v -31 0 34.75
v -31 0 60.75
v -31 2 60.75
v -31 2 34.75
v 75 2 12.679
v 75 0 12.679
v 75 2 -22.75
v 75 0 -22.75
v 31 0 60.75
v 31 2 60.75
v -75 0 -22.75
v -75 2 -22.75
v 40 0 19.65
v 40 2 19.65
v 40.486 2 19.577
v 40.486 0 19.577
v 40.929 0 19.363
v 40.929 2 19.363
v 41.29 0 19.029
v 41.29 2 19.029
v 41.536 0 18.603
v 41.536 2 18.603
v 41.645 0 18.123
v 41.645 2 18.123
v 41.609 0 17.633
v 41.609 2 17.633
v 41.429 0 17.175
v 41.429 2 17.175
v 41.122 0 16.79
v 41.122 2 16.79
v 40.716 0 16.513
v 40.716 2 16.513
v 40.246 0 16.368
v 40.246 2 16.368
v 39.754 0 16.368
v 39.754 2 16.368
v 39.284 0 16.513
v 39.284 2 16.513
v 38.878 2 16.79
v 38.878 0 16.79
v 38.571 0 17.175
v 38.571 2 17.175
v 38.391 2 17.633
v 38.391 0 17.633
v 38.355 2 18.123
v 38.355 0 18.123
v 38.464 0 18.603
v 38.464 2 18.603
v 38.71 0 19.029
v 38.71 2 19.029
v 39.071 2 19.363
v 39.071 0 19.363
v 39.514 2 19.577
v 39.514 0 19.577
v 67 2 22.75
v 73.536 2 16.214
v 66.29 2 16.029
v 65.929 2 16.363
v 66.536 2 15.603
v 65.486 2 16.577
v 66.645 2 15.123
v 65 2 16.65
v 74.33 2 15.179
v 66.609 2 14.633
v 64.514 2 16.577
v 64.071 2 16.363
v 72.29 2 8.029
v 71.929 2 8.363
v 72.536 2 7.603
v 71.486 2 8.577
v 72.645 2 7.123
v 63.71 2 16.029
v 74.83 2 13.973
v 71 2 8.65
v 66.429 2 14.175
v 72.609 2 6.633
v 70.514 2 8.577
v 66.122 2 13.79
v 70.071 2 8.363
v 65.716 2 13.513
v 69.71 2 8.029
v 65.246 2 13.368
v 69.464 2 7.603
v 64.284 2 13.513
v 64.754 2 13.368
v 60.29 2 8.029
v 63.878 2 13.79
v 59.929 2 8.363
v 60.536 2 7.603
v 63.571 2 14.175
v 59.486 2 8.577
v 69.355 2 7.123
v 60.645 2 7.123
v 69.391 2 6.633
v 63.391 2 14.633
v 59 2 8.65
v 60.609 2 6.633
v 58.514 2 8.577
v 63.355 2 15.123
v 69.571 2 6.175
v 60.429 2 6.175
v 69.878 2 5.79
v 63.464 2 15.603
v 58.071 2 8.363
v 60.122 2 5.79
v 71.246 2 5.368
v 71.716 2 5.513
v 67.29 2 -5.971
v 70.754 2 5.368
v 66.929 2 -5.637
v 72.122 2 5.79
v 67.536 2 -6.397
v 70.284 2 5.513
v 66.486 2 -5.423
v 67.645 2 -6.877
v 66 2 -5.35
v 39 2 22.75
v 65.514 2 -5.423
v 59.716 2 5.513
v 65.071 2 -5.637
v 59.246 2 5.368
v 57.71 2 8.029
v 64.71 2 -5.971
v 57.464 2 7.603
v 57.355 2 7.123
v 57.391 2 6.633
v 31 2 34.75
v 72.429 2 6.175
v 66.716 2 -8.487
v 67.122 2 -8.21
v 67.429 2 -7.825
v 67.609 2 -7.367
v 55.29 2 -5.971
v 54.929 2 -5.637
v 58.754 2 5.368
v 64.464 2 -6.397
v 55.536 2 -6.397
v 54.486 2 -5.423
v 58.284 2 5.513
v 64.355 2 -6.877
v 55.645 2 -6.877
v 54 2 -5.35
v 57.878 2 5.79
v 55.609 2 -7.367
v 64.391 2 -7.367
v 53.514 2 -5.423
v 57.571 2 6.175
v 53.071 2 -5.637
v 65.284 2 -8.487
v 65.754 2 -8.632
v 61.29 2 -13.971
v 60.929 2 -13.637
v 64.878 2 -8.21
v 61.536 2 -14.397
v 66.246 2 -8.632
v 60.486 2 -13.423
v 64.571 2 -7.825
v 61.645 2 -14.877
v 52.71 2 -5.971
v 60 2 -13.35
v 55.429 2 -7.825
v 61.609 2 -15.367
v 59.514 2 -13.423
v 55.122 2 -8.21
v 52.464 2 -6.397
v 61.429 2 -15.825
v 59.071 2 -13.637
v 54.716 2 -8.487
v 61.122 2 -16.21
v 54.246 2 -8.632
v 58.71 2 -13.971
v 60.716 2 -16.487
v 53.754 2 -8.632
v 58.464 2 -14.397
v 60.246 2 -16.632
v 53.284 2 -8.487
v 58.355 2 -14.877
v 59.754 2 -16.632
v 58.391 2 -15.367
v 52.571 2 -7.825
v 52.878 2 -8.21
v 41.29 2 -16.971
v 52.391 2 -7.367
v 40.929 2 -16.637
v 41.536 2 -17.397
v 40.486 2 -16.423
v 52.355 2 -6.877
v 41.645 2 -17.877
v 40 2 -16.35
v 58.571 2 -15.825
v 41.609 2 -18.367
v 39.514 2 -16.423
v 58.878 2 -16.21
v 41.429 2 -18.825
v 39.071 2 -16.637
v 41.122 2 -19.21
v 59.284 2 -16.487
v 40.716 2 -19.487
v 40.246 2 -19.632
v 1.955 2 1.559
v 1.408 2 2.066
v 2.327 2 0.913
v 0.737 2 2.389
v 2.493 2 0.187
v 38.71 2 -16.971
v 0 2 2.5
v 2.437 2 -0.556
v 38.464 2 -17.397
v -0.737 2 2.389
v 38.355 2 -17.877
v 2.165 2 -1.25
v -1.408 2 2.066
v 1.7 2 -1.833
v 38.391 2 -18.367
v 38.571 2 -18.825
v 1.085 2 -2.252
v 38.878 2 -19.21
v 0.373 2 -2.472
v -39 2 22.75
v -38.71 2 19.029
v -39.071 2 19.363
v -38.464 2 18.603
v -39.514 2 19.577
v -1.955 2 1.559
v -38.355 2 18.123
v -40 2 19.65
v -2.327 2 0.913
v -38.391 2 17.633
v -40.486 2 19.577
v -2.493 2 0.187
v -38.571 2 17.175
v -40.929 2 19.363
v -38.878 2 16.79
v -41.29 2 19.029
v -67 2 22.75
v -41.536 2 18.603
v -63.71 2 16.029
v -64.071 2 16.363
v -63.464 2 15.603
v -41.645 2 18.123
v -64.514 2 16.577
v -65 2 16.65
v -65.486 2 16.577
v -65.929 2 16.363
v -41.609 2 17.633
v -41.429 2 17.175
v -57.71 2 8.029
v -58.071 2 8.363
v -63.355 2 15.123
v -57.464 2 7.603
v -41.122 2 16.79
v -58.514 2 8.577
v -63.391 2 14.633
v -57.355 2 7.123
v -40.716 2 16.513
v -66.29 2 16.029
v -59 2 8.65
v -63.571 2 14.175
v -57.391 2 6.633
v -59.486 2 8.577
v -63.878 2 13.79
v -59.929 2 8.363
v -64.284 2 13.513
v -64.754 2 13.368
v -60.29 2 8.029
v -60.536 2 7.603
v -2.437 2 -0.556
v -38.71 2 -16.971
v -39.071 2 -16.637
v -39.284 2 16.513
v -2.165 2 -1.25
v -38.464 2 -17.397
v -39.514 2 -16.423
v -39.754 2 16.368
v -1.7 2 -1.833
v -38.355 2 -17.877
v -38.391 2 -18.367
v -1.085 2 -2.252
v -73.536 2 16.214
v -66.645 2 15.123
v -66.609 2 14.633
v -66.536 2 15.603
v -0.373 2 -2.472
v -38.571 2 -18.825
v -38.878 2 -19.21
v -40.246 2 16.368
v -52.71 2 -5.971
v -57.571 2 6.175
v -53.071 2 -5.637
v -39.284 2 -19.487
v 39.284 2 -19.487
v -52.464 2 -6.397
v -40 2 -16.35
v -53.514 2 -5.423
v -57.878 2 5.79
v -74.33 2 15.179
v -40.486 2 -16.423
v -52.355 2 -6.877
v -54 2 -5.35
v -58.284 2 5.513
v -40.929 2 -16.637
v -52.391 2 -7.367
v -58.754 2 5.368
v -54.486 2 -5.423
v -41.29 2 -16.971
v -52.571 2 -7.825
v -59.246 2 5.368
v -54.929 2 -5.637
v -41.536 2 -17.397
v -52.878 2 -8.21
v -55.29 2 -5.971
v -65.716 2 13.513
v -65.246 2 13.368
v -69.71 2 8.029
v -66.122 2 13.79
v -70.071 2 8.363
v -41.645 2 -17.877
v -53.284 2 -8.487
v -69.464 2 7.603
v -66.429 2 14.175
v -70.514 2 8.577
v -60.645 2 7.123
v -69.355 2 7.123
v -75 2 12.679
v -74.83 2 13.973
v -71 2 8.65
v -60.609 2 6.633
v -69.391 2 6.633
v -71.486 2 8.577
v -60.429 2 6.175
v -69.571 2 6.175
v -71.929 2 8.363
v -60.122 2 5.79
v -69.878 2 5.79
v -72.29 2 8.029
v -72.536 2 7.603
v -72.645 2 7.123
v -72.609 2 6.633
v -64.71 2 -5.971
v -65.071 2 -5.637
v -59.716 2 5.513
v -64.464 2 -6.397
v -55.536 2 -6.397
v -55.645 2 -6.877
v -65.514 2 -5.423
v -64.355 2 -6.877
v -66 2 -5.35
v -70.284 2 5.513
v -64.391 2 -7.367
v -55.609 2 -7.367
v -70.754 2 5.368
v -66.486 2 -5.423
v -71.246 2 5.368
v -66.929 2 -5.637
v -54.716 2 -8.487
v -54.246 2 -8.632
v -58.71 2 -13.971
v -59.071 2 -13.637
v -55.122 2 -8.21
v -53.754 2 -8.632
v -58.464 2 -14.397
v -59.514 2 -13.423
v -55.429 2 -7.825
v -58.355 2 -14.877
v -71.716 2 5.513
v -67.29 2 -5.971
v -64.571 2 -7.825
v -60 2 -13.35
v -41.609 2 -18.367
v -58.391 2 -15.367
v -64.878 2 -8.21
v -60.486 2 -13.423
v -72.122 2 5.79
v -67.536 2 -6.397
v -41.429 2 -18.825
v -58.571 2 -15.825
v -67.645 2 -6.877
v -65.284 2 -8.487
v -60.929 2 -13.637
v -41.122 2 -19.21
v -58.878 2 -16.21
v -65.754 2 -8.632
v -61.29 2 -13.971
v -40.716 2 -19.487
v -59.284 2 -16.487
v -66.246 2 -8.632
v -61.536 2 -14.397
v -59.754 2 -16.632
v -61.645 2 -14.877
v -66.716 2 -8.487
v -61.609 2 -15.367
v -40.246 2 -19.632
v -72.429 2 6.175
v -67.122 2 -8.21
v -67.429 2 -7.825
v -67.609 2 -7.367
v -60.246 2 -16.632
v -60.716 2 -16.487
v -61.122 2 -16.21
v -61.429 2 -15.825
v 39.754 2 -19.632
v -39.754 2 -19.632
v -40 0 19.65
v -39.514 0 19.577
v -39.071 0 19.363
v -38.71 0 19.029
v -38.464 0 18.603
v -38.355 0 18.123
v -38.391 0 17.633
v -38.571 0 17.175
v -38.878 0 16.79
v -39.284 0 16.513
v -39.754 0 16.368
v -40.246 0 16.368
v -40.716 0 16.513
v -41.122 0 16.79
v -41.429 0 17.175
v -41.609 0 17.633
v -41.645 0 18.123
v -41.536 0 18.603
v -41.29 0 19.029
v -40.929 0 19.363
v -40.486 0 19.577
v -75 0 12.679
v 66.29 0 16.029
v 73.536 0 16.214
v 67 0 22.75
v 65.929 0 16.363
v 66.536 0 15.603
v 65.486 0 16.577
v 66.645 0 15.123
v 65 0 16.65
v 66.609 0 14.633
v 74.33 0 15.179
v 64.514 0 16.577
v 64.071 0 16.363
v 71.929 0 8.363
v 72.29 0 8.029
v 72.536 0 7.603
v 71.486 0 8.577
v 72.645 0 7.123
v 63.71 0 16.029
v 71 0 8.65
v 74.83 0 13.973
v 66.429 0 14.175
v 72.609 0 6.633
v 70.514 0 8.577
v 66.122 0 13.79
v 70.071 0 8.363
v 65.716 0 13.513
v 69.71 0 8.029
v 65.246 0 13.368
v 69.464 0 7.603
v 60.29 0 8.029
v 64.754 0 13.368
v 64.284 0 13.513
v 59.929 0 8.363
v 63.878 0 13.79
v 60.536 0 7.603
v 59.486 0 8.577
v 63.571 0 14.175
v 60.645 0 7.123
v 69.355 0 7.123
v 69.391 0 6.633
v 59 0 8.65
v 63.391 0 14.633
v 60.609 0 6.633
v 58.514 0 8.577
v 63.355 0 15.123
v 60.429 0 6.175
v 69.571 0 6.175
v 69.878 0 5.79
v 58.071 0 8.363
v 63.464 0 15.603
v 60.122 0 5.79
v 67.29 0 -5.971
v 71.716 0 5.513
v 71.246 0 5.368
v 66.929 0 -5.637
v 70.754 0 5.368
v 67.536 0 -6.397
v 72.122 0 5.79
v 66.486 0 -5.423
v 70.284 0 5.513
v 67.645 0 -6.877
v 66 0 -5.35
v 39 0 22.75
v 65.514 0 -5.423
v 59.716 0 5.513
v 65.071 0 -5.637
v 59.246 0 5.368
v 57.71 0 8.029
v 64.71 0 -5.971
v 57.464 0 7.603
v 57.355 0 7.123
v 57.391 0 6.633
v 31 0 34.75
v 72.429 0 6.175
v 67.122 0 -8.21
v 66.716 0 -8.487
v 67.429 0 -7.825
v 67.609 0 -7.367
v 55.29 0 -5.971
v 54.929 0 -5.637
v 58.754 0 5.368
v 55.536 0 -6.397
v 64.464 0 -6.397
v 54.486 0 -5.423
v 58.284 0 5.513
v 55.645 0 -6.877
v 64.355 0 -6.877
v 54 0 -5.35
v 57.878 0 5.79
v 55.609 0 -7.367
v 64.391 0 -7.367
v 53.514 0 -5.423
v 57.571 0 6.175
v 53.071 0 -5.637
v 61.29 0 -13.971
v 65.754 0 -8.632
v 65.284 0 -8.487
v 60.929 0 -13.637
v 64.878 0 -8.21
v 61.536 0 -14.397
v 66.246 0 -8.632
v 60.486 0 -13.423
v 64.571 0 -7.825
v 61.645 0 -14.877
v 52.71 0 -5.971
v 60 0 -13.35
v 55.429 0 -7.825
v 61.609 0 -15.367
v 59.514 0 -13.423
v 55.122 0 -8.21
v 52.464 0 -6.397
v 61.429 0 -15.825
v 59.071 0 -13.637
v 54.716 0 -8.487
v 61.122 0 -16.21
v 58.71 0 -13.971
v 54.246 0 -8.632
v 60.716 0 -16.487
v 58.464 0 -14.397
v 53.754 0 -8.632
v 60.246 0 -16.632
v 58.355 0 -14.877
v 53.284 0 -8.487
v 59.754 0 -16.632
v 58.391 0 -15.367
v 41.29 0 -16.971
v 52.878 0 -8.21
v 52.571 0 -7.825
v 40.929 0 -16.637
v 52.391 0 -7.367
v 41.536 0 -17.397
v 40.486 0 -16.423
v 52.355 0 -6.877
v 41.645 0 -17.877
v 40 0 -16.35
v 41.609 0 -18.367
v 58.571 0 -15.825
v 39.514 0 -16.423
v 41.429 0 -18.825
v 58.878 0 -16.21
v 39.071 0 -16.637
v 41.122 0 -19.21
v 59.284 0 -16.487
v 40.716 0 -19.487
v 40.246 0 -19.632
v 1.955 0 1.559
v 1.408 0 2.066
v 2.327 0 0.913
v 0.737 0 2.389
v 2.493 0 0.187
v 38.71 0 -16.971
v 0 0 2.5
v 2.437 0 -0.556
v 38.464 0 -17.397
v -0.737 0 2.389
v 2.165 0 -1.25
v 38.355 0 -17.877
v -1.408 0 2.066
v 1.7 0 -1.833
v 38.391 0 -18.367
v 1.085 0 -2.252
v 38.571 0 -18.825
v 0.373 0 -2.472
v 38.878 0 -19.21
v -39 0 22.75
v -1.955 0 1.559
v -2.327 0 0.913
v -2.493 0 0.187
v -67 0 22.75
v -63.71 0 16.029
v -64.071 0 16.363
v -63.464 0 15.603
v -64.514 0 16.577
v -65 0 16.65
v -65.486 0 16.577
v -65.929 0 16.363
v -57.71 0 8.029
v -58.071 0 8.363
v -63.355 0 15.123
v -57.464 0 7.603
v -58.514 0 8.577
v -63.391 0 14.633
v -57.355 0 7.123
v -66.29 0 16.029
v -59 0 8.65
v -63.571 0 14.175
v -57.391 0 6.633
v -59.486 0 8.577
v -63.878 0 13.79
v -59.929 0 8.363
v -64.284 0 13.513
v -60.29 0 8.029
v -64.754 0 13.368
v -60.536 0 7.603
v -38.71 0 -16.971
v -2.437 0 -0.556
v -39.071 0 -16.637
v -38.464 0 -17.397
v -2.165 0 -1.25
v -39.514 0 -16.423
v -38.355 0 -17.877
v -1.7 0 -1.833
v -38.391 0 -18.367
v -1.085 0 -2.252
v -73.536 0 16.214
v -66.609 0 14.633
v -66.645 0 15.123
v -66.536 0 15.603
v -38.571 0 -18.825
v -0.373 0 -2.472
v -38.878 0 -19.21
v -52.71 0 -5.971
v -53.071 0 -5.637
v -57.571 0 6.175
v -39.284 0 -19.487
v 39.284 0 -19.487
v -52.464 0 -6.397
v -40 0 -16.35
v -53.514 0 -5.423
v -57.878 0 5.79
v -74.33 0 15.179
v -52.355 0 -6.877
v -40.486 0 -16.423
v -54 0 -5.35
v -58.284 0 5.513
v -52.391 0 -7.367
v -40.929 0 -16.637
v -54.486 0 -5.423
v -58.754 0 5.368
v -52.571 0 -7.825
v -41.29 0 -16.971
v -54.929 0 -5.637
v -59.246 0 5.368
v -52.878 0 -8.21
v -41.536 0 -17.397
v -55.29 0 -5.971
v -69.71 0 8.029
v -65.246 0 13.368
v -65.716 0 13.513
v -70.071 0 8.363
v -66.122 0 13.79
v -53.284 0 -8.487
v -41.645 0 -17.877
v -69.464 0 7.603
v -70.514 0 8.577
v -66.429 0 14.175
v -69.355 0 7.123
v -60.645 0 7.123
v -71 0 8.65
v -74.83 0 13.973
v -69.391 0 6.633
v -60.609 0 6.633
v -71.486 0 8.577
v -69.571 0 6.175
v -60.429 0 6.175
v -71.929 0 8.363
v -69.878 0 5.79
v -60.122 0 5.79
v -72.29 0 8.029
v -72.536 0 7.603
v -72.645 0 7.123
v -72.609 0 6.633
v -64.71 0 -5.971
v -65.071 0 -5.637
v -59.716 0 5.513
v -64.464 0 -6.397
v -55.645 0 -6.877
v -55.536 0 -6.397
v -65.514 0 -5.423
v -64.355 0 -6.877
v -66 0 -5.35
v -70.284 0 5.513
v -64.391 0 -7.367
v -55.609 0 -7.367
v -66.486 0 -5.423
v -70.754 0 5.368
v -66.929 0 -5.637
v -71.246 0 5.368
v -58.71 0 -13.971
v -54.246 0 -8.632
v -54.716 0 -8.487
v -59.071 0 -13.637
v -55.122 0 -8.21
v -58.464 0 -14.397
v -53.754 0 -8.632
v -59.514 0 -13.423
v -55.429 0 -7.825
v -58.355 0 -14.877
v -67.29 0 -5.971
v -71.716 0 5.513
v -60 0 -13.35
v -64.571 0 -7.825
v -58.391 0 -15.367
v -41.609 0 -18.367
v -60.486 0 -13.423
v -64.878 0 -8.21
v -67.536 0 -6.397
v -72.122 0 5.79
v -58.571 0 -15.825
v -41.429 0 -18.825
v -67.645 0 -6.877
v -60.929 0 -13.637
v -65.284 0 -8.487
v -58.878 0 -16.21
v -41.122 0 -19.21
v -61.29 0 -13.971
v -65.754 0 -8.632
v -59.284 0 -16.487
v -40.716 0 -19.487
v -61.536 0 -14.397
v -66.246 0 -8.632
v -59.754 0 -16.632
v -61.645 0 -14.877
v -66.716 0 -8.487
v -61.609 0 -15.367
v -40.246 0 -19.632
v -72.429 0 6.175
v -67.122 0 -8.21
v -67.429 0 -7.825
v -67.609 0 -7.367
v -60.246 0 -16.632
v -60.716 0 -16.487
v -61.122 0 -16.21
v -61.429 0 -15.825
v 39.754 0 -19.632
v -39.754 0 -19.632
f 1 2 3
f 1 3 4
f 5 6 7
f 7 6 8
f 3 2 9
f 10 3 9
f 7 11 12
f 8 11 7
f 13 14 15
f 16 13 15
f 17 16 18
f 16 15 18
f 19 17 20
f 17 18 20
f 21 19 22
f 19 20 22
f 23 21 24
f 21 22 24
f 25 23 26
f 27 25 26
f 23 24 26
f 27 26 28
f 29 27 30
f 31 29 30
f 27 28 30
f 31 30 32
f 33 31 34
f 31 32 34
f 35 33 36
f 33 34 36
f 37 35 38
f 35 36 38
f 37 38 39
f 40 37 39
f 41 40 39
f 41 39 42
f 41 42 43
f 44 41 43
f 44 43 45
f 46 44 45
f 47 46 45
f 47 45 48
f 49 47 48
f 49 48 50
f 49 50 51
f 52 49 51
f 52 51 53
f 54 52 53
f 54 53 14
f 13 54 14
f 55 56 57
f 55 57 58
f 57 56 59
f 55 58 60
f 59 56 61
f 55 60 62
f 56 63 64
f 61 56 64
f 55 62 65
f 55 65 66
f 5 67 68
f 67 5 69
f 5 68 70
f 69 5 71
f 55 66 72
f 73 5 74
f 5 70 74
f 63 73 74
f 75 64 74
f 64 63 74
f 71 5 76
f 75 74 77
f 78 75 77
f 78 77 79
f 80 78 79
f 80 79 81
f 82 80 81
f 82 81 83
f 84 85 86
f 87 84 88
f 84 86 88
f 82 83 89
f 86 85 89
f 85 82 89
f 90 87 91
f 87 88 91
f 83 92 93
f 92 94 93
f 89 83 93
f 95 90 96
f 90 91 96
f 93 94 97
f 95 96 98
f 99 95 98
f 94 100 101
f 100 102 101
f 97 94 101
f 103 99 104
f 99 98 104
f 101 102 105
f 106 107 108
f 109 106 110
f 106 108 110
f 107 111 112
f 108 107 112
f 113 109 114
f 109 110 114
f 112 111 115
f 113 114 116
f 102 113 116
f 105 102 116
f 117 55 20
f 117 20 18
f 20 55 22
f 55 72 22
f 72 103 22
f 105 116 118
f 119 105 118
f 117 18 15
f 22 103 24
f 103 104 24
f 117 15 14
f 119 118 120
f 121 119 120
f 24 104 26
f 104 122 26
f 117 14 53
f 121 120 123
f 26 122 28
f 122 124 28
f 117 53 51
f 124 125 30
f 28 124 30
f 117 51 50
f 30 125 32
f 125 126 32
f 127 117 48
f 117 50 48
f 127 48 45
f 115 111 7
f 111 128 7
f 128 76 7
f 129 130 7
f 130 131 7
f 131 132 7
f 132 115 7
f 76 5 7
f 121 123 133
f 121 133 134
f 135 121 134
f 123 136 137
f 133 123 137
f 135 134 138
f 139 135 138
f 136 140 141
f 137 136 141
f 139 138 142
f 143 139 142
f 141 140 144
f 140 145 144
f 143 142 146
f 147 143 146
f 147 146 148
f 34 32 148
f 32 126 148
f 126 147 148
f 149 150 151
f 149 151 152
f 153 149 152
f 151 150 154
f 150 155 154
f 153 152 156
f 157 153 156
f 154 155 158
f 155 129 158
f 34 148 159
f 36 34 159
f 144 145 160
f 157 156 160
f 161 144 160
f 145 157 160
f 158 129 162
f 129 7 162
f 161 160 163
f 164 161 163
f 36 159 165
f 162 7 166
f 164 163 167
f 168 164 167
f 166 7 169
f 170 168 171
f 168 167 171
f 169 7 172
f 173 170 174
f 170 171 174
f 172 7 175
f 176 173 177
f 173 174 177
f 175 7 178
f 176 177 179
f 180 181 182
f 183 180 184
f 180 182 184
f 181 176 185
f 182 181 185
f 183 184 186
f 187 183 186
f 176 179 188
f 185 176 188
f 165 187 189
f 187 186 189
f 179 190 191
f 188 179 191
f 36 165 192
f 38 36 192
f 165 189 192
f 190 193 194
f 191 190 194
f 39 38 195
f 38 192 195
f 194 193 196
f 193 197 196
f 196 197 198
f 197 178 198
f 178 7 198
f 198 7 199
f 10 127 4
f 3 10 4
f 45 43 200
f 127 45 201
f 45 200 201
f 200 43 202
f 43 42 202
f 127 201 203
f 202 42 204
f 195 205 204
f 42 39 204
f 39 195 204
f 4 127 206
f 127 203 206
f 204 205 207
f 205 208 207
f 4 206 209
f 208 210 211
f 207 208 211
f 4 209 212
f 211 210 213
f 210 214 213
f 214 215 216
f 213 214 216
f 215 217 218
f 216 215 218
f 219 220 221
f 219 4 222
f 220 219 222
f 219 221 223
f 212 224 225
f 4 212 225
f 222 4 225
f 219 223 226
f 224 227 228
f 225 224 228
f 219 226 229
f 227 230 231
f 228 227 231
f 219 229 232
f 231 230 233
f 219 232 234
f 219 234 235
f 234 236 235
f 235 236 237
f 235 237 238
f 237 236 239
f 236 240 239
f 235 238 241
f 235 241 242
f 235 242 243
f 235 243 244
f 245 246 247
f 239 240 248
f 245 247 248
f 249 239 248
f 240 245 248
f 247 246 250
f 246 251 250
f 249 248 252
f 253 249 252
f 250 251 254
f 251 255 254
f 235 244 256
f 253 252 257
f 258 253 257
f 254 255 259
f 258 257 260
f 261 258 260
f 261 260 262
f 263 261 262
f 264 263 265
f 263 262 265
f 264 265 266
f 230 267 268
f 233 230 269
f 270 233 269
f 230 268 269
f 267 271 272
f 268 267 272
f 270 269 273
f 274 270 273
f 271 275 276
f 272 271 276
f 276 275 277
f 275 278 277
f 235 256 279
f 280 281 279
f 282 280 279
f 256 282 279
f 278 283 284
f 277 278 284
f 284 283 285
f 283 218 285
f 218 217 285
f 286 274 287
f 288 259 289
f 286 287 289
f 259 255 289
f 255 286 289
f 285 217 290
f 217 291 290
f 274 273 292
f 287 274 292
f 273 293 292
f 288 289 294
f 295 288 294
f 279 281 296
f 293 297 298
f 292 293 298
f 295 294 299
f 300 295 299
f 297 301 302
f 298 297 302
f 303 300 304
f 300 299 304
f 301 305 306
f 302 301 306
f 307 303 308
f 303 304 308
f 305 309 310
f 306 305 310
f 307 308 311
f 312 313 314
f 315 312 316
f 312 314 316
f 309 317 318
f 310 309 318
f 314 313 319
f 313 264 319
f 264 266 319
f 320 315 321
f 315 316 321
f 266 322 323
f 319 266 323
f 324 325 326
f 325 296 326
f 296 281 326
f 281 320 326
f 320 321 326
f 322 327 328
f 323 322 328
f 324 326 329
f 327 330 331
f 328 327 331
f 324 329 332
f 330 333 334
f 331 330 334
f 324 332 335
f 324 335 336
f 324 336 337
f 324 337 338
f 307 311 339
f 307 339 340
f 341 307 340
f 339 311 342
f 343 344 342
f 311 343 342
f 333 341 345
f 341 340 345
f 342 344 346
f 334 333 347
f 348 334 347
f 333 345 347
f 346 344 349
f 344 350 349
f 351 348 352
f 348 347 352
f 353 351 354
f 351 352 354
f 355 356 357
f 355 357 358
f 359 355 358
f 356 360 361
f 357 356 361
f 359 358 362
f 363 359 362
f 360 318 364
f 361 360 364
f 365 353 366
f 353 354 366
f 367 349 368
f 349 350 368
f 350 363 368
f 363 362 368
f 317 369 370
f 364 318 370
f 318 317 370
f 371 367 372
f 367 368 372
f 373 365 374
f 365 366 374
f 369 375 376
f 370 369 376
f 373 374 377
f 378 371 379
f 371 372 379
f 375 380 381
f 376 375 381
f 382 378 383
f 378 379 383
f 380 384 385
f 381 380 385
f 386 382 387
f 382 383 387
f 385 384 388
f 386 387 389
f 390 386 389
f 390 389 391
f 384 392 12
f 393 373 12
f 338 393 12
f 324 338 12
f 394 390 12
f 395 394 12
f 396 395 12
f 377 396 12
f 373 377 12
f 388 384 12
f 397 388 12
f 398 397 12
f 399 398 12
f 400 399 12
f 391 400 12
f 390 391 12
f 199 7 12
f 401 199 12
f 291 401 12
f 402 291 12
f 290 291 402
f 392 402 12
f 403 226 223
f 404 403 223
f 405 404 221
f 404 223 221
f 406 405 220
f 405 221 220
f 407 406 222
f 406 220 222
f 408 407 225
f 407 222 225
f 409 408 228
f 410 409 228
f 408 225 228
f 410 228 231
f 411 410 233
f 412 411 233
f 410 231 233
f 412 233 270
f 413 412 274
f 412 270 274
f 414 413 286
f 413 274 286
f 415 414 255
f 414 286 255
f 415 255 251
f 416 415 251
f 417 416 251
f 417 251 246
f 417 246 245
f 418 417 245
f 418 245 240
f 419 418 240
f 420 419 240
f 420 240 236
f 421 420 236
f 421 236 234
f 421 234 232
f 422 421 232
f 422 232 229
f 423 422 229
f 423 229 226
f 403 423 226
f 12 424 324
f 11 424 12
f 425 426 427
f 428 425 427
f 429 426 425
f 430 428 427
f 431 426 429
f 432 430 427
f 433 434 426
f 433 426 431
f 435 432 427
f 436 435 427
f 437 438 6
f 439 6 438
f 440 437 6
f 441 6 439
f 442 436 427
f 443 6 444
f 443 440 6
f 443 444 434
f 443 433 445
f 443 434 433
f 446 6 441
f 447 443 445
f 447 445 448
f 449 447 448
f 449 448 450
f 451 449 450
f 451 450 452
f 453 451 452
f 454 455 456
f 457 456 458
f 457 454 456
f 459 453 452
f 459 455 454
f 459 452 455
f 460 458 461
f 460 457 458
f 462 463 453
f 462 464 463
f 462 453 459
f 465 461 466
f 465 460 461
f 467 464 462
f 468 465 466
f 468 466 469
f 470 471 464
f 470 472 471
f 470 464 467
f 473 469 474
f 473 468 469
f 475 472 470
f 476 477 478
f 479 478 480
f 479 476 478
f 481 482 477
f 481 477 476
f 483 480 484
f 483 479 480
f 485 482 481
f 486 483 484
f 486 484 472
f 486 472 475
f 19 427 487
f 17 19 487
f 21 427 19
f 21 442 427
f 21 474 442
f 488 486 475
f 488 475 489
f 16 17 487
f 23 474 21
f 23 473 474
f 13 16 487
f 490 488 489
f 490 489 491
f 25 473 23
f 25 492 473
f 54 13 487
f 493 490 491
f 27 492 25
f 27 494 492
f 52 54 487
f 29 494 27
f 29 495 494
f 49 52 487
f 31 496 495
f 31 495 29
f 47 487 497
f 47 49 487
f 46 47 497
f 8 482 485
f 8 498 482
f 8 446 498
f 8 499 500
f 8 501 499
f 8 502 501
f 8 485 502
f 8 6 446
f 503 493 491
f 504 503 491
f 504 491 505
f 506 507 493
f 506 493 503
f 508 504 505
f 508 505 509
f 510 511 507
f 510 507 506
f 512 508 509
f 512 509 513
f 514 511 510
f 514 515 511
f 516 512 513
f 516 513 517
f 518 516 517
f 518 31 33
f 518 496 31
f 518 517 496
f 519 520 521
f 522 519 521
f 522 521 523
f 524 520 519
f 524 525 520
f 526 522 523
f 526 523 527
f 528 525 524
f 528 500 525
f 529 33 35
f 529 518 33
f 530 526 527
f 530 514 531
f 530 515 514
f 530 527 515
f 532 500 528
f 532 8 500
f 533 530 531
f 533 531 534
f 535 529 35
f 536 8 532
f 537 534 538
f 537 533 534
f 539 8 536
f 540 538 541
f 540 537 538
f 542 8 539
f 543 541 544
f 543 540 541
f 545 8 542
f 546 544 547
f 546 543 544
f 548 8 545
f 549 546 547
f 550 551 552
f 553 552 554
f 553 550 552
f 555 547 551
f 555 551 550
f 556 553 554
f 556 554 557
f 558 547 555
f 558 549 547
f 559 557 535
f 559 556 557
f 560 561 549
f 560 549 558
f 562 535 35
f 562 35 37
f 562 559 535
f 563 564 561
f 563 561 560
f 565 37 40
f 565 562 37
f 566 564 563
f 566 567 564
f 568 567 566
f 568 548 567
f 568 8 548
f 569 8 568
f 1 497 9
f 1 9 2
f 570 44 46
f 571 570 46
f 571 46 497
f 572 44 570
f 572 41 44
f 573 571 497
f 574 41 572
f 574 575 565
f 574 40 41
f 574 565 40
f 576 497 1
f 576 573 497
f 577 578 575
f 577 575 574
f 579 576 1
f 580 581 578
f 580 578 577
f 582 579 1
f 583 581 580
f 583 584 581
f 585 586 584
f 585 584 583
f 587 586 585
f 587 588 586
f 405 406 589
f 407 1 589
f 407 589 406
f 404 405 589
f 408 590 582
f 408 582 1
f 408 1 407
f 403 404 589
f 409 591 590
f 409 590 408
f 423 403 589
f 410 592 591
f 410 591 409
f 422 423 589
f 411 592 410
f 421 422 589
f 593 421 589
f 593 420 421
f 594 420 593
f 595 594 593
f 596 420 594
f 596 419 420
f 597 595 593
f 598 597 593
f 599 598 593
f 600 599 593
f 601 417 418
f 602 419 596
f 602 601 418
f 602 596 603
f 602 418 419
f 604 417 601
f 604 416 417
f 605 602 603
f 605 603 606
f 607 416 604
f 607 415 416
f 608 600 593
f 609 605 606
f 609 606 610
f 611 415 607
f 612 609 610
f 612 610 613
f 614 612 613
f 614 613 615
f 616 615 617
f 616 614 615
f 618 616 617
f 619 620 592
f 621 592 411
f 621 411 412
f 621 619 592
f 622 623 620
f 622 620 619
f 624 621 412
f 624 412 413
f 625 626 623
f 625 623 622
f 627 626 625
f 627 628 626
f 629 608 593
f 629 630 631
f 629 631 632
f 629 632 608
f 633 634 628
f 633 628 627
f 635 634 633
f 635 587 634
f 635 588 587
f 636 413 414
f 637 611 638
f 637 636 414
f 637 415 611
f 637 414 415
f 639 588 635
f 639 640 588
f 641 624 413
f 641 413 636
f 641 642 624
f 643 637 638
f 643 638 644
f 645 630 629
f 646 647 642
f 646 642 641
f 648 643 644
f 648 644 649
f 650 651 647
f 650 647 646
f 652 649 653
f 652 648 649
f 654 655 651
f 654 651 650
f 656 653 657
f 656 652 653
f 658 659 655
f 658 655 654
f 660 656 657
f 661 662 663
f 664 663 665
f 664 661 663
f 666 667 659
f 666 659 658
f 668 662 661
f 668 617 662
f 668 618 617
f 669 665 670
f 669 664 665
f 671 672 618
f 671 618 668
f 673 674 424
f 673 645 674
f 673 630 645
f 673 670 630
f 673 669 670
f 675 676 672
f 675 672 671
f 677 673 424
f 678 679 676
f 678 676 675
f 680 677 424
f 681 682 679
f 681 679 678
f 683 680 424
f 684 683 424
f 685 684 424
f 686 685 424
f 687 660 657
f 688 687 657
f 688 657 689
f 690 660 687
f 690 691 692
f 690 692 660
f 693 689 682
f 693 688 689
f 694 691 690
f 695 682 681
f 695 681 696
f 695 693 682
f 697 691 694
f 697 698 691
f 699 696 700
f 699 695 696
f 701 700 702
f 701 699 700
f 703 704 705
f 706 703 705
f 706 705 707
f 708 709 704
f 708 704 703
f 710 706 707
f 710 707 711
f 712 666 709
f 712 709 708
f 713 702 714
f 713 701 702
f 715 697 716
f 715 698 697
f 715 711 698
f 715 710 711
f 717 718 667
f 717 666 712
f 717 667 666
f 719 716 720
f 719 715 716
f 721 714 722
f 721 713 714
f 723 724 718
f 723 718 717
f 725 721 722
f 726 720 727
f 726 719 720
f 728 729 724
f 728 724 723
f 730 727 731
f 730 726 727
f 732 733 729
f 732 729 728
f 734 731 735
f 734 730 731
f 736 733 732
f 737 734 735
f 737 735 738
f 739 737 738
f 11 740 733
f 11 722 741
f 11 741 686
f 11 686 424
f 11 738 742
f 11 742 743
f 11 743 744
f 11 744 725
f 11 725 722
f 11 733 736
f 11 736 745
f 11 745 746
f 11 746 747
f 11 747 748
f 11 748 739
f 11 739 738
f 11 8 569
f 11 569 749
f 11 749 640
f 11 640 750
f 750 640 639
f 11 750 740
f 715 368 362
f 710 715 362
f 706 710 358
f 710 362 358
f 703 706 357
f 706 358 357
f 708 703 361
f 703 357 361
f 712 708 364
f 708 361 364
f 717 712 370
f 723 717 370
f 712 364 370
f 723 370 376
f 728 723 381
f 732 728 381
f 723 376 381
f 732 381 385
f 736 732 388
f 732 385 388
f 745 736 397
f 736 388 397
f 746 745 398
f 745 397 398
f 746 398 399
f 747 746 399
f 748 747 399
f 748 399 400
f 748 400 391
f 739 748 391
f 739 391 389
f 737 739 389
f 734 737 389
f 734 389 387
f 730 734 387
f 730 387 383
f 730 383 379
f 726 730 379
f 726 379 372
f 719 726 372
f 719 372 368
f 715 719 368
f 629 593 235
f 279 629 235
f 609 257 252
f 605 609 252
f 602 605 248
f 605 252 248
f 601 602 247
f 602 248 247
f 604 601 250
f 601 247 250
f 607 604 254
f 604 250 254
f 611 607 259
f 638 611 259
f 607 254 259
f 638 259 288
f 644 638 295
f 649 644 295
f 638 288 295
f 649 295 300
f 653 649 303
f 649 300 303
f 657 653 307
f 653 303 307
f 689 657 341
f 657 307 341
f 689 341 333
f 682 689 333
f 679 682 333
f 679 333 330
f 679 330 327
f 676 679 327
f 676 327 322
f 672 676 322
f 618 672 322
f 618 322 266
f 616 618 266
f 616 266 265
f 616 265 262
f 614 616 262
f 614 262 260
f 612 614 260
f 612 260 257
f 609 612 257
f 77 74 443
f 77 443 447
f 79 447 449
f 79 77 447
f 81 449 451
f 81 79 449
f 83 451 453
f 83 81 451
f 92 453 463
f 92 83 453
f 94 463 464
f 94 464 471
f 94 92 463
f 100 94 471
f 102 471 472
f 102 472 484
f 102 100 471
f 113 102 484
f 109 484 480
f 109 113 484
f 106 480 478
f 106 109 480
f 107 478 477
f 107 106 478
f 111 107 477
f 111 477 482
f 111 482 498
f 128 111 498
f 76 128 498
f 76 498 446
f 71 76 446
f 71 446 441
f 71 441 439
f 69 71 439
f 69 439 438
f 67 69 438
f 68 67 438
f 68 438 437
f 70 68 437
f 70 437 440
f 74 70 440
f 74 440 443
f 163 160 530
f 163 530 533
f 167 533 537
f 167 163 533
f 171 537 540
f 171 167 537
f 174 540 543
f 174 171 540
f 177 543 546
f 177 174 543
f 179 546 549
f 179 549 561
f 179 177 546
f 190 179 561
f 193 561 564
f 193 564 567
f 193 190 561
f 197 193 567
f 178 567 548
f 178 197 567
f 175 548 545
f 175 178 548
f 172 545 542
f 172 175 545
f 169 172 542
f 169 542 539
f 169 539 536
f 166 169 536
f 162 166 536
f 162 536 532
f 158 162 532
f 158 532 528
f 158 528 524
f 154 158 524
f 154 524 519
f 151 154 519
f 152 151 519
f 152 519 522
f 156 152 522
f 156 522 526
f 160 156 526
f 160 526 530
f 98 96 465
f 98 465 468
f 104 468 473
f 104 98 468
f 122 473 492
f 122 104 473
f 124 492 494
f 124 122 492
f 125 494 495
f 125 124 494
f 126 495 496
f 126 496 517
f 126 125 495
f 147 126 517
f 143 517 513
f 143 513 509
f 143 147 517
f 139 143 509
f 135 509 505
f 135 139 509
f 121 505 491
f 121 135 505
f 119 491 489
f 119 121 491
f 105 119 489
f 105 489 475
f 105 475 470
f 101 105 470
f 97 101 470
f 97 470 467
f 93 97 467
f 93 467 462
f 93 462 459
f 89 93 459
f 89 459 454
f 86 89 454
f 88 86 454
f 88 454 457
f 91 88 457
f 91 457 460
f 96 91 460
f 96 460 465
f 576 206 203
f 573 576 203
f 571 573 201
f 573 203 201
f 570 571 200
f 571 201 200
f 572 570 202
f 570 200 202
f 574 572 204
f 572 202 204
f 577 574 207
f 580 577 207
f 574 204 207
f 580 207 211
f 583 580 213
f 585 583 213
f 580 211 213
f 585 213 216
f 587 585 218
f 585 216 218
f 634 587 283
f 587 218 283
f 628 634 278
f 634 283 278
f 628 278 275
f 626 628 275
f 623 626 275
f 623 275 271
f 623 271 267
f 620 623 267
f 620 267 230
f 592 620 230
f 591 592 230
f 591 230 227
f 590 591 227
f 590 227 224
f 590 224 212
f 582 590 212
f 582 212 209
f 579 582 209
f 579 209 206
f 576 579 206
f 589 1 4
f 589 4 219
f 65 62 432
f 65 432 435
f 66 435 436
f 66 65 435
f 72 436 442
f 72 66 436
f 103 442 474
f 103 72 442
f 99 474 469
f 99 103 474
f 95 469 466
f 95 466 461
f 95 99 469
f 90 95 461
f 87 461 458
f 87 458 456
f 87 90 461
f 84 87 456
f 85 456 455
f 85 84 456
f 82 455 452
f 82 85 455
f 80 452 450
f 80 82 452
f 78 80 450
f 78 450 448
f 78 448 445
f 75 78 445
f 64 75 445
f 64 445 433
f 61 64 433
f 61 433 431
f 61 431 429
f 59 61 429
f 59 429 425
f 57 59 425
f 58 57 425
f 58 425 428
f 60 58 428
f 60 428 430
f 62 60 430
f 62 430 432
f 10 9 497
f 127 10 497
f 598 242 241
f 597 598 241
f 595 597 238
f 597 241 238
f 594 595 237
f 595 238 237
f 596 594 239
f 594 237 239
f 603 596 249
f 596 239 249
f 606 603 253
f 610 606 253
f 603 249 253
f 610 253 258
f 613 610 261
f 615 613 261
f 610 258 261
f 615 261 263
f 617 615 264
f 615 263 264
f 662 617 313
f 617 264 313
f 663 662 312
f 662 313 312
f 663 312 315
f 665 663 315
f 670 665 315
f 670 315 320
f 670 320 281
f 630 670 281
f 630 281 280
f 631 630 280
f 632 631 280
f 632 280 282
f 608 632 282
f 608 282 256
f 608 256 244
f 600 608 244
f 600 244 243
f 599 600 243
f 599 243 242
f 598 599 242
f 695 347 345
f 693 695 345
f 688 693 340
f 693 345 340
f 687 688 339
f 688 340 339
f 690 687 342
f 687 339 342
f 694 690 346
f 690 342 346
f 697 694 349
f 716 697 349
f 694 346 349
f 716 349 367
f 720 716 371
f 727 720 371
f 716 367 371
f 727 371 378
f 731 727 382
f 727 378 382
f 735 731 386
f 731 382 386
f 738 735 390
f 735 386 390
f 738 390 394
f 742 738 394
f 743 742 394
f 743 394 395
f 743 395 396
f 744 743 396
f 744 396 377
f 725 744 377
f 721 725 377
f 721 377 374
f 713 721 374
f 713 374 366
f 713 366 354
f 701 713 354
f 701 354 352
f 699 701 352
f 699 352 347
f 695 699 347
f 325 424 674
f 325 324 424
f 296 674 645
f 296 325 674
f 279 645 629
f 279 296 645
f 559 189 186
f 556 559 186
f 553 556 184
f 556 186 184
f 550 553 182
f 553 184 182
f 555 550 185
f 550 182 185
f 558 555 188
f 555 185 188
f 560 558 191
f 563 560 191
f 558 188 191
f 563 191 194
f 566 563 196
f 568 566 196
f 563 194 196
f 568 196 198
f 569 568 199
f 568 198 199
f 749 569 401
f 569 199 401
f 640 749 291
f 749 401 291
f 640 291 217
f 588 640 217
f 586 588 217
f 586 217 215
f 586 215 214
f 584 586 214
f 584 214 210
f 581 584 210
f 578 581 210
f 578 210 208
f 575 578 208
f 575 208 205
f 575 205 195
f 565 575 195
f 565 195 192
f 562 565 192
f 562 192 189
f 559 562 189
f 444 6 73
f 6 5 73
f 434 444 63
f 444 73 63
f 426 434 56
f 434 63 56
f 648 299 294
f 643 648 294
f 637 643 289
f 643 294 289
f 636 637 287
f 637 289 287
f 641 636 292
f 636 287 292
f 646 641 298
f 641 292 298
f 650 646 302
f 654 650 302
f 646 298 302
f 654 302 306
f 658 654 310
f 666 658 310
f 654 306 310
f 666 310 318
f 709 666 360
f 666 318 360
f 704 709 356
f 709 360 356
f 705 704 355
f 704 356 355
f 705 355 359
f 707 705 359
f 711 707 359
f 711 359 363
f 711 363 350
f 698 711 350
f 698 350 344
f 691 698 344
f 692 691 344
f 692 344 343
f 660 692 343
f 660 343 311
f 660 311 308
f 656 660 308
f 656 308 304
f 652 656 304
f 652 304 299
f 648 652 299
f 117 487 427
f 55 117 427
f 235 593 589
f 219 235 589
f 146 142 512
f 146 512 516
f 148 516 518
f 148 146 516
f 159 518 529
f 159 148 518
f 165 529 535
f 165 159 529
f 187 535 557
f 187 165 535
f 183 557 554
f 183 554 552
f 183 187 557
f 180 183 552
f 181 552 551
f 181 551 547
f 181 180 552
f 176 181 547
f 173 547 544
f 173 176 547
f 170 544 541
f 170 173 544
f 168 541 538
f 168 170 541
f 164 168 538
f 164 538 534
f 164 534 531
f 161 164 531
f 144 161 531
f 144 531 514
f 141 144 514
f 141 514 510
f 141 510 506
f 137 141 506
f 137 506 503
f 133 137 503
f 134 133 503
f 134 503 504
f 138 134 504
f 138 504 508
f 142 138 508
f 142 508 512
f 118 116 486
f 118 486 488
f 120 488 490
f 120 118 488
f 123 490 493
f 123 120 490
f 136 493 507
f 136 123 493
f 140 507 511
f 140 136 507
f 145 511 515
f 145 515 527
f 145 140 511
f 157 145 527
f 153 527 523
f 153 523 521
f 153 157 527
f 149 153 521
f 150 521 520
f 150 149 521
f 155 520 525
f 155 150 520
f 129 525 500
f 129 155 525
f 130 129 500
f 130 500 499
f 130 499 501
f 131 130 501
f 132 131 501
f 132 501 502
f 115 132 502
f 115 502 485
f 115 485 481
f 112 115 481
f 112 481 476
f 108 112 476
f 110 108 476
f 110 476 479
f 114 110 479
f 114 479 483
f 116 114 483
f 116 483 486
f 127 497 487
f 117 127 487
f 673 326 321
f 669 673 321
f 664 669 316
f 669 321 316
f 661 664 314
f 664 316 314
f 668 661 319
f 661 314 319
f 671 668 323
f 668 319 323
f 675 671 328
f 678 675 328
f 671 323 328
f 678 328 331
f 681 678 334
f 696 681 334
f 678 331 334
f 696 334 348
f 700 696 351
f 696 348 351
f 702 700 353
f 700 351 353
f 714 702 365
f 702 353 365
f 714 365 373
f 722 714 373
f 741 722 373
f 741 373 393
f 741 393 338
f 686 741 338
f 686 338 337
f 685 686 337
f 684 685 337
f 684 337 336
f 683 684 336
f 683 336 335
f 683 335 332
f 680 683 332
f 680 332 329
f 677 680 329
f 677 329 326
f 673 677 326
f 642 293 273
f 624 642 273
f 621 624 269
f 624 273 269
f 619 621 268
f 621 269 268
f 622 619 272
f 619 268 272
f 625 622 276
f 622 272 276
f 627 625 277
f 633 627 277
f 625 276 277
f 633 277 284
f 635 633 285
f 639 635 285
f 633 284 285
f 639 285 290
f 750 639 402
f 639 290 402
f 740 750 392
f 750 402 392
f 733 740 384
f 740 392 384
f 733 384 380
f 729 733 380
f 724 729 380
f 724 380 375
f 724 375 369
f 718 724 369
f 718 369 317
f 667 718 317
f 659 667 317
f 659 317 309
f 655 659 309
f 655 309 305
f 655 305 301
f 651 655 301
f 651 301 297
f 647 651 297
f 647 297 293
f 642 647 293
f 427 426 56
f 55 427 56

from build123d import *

# Parameters (mm, degrees)
SKETCH_1_W             = 150
SKETCH_1_H             = 45.5
EXTRUDE_1_DEPTH        = 2
CUT_EXTRUDE_1_REACH    = 80.4
SKETCH_2_R             = 1.65
CHAMFER_1_SIZE         = 8
CUT_EXTRUDE_1139_REACH = 80.4
SKETCH_3_R             = 2.5
CUT_EXTRUDE_2_REACH    = 80.4
SKETCH_4_R             = 1.65
FILLET_1_R             = 5
SKETCH_5_W             = 62
SKETCH_5_H             = 38
EXTRUDE_2_DEPTH        = 2
EXTRUDE_3_DEPTH        = 2


with BuildPart() as part:
    # 草图1 → 凸台-拉伸1 (new body)
    with BuildSketch(Plane(origin=(0, 0, 0), x_dir=(1, 0, 0), z_dir=(0, 1, 0))):
        Rectangle(SKETCH_1_W, SKETCH_1_H)
    extrude(amount=EXTRUDE_1_DEPTH)

    # 草图2 → 切除-拉伸1 (cut, up to next)
    with BuildSketch(Plane(origin=(0, 2, 0), x_dir=(1, 0, 0), z_dir=(0, 1, 0)), mode=Mode.PRIVATE) as cut_extrude_1_sk1:
        with Locations(Location((-60, 15, 0), (0, 0, 270))):
            Circle(SKETCH_2_R)
    cut_extrude_1_tool1 = extrude(cut_extrude_1_sk1.sketch, amount=-CUT_EXTRUDE_1_REACH, mode=Mode.PRIVATE) & part.part
    # 草图2 → 切除-拉伸1 (cut, up to next)
    with BuildSketch(Plane(origin=(0, 2, 0), x_dir=(1, 0, 0), z_dir=(0, 1, 0)), mode=Mode.PRIVATE) as cut_extrude_1_sk2:
        with Locations(Location((-66, 7, 0), (0, 0, 270))):
            Circle(SKETCH_2_R)
    cut_extrude_1_tool2 = extrude(cut_extrude_1_sk2.sketch, amount=-CUT_EXTRUDE_1_REACH, mode=Mode.PRIVATE) & part.part
    # 草图2 → 切除-拉伸1 (cut, up to next)
    with BuildSketch(Plane(origin=(0, 2, 0), x_dir=(1, 0, 0), z_dir=(0, 1, 0)), mode=Mode.PRIVATE) as cut_extrude_1_sk3:
        with Locations(Location((-54, 7, 0), (0, 0, 270))):
            Circle(SKETCH_2_R)
    cut_extrude_1_tool3 = extrude(cut_extrude_1_sk3.sketch, amount=-CUT_EXTRUDE_1_REACH, mode=Mode.PRIVATE) & part.part
    # 草图2 → 切除-拉伸1 (cut, up to next)
    with BuildSketch(Plane(origin=(0, 2, 0), x_dir=(1, 0, 0), z_dir=(0, 1, 0)), mode=Mode.PRIVATE) as cut_extrude_1_sk4:
        with Locations(Location((-71, -7, 0), (0, 0, 270))):
            Circle(SKETCH_2_R)
    cut_extrude_1_tool4 = extrude(cut_extrude_1_sk4.sketch, amount=-CUT_EXTRUDE_1_REACH, mode=Mode.PRIVATE) & part.part
    # 草图2 → 切除-拉伸1 (cut, up to next)
    with BuildSketch(Plane(origin=(0, 2, 0), x_dir=(1, 0, 0), z_dir=(0, 1, 0)), mode=Mode.PRIVATE) as cut_extrude_1_sk5:
        with Locations(Location((-59, -7, 0), (0, 0, 270))):
            Circle(SKETCH_2_R)
    cut_extrude_1_tool5 = extrude(cut_extrude_1_sk5.sketch, amount=-CUT_EXTRUDE_1_REACH, mode=Mode.PRIVATE) & part.part
    # 草图2 → 切除-拉伸1 (cut, up to next)
    with BuildSketch(Plane(origin=(0, 2, 0), x_dir=(1, 0, 0), z_dir=(0, 1, 0)), mode=Mode.PRIVATE) as cut_extrude_1_sk6:
        with Locations(Location((-65, -15, 0), (0, 0, 270))):
            Circle(SKETCH_2_R)
    cut_extrude_1_tool6 = extrude(cut_extrude_1_sk6.sketch, amount=-CUT_EXTRUDE_1_REACH, mode=Mode.PRIVATE) & part.part
    cut_extrude_1_1 = cut_extrude_1_tool1.solids().sort_by_distance((-60, 2, -15))[0]
    add(cut_extrude_1_1, mode=Mode.SUBTRACT)
    cut_extrude_1_2 = cut_extrude_1_tool2.solids().sort_by_distance((-66, 2, -7))[0]
    add(cut_extrude_1_2, mode=Mode.SUBTRACT)
    cut_extrude_1_3 = cut_extrude_1_tool3.solids().sort_by_distance((-54, 2, -7))[0]
    add(cut_extrude_1_3, mode=Mode.SUBTRACT)
    cut_extrude_1_4 = cut_extrude_1_tool4.solids().sort_by_distance((-71, 2, 7))[0]
    add(cut_extrude_1_4, mode=Mode.SUBTRACT)
    cut_extrude_1_5 = cut_extrude_1_tool5.solids().sort_by_distance((-59, 2, 7))[0]
    add(cut_extrude_1_5, mode=Mode.SUBTRACT)
    cut_extrude_1_6 = cut_extrude_1_tool6.solids().sort_by_distance((-65, 2, 15))[0]
    add(cut_extrude_1_6, mode=Mode.SUBTRACT)
    cut_extrude_1 = cut_extrude_1_1 + cut_extrude_1_2 + cut_extrude_1_3 + cut_extrude_1_4 + cut_extrude_1_5 + cut_extrude_1_6  # 切除-拉伸1 as one shape, for the pattern or mirror that repeats it

    # 镜向1: 切除-拉伸1 across plane
    add(cut_extrude_1.mirror(Plane(origin=(0, 0, 0), x_dir=(0, 0, 1), z_dir=(1, 0, 0))), mode=Mode.SUBTRACT)

    # 倒角1
    chamfer_1_edges = [part.edges().sort_by_distance(p)[0] for p in [
        (75, 1, 22.75),
        (-75, 1, 22.75),
    ]]
    chamfer(chamfer_1_edges, length=CHAMFER_1_SIZE)

    # 草图3 → Cut-Extrude 1139 (cut, up to next)
    with BuildSketch(Plane(origin=(0, 2, 0), x_dir=(1, 0, 0), z_dir=(0, 1, 0)), mode=Mode.PRIVATE) as cut_extrude_1139_sk1:
        with Locations(Location((0, 0, 0), (0, 0, 270))):
            Circle(SKETCH_3_R)
    cut_extrude_1139_tool1 = extrude(cut_extrude_1139_sk1.sketch, amount=-CUT_EXTRUDE_1139_REACH, mode=Mode.PRIVATE) & part.part
    add(cut_extrude_1139_tool1.solids().sort_by_distance((0, 2, 0))[0], mode=Mode.SUBTRACT)

    # 草图4 → 切除-拉伸2 (cut, up to next)
    with BuildSketch(Plane(origin=(0, 2, 0), x_dir=(1, 0, 0), z_dir=(0, 1, 0)), mode=Mode.PRIVATE) as cut_extrude_2_sk1:
        with Locations(Location((-40, 18, 0), (0, 0, 270))):
            Circle(SKETCH_4_R)
    cut_extrude_2_tool1 = extrude(cut_extrude_2_sk1.sketch, amount=-CUT_EXTRUDE_2_REACH, mode=Mode.PRIVATE) & part.part
    # 草图4 → 切除-拉伸2 (cut, up to next)
    with BuildSketch(Plane(origin=(0, 2, 0), x_dir=(1, 0, 0), z_dir=(0, 1, 0)), mode=Mode.PRIVATE) as cut_extrude_2_sk2:
        with Locations(Location((-40, -18, 0), (0, 0, 270))):
            Circle(SKETCH_4_R)
    cut_extrude_2_tool2 = extrude(cut_extrude_2_sk2.sketch, amount=-CUT_EXTRUDE_2_REACH, mode=Mode.PRIVATE) & part.part
    # 草图4 → 切除-拉伸2 (cut, up to next)
    with BuildSketch(Plane(origin=(0, 2, 0), x_dir=(1, 0, 0), z_dir=(0, 1, 0)), mode=Mode.PRIVATE) as cut_extrude_2_sk3:
        with Locations(Location((40, 18, 0), (0, 0, 270))):
            Circle(SKETCH_4_R)
    cut_extrude_2_tool3 = extrude(cut_extrude_2_sk3.sketch, amount=-CUT_EXTRUDE_2_REACH, mode=Mode.PRIVATE) & part.part
    # 草图4 → 切除-拉伸2 (cut, up to next)
    with BuildSketch(Plane(origin=(0, 2, 0), x_dir=(1, 0, 0), z_dir=(0, 1, 0)), mode=Mode.PRIVATE) as cut_extrude_2_sk4:
        with Locations(Location((40, -18, 0), (0, 0, 270))):
            Circle(SKETCH_4_R)
    cut_extrude_2_tool4 = extrude(cut_extrude_2_sk4.sketch, amount=-CUT_EXTRUDE_2_REACH, mode=Mode.PRIVATE) & part.part
    add(cut_extrude_2_tool1.solids().sort_by_distance((-40, 2, -18))[0], mode=Mode.SUBTRACT)
    add(cut_extrude_2_tool2.solids().sort_by_distance((-40, 2, 18))[0], mode=Mode.SUBTRACT)
    add(cut_extrude_2_tool3.solids().sort_by_distance((40, 2, -18))[0], mode=Mode.SUBTRACT)
    add(cut_extrude_2_tool4.solids().sort_by_distance((40, 2, 18))[0], mode=Mode.SUBTRACT)

    # 圆角1
    fillet_1_edges = [part.edges().sort_by_distance(p)[0] for p in [
        (75, 1, 14.75),
        (-75, 1, 14.75),
    ]]
    fillet(fillet_1_edges, radius=FILLET_1_R)

    # 草图5 → 凸台-拉伸2 (add)
    with BuildSketch(Plane(origin=(0, 0, 0), x_dir=(1, 0, 0), z_dir=(0, 1, 0))):
        with Locations((0, -41.75)):
            Rectangle(SKETCH_5_W, SKETCH_5_H)
    extrude(amount=EXTRUDE_2_DEPTH)

    # 草图6 → 凸台-拉伸3 (add)
    with BuildSketch(Plane(origin=(0, 0, 0), x_dir=(1, 0, 0), z_dir=(0, 1, 0))):
        Polygon((-31, -22.75), (-31, -34.75), (-39, -22.75), align=None)
        Polygon((31, -22.75), (31, -34.75), (39, -22.75), align=None)
    extrude(amount=EXTRUDE_3_DEPTH)


solid = part.part
